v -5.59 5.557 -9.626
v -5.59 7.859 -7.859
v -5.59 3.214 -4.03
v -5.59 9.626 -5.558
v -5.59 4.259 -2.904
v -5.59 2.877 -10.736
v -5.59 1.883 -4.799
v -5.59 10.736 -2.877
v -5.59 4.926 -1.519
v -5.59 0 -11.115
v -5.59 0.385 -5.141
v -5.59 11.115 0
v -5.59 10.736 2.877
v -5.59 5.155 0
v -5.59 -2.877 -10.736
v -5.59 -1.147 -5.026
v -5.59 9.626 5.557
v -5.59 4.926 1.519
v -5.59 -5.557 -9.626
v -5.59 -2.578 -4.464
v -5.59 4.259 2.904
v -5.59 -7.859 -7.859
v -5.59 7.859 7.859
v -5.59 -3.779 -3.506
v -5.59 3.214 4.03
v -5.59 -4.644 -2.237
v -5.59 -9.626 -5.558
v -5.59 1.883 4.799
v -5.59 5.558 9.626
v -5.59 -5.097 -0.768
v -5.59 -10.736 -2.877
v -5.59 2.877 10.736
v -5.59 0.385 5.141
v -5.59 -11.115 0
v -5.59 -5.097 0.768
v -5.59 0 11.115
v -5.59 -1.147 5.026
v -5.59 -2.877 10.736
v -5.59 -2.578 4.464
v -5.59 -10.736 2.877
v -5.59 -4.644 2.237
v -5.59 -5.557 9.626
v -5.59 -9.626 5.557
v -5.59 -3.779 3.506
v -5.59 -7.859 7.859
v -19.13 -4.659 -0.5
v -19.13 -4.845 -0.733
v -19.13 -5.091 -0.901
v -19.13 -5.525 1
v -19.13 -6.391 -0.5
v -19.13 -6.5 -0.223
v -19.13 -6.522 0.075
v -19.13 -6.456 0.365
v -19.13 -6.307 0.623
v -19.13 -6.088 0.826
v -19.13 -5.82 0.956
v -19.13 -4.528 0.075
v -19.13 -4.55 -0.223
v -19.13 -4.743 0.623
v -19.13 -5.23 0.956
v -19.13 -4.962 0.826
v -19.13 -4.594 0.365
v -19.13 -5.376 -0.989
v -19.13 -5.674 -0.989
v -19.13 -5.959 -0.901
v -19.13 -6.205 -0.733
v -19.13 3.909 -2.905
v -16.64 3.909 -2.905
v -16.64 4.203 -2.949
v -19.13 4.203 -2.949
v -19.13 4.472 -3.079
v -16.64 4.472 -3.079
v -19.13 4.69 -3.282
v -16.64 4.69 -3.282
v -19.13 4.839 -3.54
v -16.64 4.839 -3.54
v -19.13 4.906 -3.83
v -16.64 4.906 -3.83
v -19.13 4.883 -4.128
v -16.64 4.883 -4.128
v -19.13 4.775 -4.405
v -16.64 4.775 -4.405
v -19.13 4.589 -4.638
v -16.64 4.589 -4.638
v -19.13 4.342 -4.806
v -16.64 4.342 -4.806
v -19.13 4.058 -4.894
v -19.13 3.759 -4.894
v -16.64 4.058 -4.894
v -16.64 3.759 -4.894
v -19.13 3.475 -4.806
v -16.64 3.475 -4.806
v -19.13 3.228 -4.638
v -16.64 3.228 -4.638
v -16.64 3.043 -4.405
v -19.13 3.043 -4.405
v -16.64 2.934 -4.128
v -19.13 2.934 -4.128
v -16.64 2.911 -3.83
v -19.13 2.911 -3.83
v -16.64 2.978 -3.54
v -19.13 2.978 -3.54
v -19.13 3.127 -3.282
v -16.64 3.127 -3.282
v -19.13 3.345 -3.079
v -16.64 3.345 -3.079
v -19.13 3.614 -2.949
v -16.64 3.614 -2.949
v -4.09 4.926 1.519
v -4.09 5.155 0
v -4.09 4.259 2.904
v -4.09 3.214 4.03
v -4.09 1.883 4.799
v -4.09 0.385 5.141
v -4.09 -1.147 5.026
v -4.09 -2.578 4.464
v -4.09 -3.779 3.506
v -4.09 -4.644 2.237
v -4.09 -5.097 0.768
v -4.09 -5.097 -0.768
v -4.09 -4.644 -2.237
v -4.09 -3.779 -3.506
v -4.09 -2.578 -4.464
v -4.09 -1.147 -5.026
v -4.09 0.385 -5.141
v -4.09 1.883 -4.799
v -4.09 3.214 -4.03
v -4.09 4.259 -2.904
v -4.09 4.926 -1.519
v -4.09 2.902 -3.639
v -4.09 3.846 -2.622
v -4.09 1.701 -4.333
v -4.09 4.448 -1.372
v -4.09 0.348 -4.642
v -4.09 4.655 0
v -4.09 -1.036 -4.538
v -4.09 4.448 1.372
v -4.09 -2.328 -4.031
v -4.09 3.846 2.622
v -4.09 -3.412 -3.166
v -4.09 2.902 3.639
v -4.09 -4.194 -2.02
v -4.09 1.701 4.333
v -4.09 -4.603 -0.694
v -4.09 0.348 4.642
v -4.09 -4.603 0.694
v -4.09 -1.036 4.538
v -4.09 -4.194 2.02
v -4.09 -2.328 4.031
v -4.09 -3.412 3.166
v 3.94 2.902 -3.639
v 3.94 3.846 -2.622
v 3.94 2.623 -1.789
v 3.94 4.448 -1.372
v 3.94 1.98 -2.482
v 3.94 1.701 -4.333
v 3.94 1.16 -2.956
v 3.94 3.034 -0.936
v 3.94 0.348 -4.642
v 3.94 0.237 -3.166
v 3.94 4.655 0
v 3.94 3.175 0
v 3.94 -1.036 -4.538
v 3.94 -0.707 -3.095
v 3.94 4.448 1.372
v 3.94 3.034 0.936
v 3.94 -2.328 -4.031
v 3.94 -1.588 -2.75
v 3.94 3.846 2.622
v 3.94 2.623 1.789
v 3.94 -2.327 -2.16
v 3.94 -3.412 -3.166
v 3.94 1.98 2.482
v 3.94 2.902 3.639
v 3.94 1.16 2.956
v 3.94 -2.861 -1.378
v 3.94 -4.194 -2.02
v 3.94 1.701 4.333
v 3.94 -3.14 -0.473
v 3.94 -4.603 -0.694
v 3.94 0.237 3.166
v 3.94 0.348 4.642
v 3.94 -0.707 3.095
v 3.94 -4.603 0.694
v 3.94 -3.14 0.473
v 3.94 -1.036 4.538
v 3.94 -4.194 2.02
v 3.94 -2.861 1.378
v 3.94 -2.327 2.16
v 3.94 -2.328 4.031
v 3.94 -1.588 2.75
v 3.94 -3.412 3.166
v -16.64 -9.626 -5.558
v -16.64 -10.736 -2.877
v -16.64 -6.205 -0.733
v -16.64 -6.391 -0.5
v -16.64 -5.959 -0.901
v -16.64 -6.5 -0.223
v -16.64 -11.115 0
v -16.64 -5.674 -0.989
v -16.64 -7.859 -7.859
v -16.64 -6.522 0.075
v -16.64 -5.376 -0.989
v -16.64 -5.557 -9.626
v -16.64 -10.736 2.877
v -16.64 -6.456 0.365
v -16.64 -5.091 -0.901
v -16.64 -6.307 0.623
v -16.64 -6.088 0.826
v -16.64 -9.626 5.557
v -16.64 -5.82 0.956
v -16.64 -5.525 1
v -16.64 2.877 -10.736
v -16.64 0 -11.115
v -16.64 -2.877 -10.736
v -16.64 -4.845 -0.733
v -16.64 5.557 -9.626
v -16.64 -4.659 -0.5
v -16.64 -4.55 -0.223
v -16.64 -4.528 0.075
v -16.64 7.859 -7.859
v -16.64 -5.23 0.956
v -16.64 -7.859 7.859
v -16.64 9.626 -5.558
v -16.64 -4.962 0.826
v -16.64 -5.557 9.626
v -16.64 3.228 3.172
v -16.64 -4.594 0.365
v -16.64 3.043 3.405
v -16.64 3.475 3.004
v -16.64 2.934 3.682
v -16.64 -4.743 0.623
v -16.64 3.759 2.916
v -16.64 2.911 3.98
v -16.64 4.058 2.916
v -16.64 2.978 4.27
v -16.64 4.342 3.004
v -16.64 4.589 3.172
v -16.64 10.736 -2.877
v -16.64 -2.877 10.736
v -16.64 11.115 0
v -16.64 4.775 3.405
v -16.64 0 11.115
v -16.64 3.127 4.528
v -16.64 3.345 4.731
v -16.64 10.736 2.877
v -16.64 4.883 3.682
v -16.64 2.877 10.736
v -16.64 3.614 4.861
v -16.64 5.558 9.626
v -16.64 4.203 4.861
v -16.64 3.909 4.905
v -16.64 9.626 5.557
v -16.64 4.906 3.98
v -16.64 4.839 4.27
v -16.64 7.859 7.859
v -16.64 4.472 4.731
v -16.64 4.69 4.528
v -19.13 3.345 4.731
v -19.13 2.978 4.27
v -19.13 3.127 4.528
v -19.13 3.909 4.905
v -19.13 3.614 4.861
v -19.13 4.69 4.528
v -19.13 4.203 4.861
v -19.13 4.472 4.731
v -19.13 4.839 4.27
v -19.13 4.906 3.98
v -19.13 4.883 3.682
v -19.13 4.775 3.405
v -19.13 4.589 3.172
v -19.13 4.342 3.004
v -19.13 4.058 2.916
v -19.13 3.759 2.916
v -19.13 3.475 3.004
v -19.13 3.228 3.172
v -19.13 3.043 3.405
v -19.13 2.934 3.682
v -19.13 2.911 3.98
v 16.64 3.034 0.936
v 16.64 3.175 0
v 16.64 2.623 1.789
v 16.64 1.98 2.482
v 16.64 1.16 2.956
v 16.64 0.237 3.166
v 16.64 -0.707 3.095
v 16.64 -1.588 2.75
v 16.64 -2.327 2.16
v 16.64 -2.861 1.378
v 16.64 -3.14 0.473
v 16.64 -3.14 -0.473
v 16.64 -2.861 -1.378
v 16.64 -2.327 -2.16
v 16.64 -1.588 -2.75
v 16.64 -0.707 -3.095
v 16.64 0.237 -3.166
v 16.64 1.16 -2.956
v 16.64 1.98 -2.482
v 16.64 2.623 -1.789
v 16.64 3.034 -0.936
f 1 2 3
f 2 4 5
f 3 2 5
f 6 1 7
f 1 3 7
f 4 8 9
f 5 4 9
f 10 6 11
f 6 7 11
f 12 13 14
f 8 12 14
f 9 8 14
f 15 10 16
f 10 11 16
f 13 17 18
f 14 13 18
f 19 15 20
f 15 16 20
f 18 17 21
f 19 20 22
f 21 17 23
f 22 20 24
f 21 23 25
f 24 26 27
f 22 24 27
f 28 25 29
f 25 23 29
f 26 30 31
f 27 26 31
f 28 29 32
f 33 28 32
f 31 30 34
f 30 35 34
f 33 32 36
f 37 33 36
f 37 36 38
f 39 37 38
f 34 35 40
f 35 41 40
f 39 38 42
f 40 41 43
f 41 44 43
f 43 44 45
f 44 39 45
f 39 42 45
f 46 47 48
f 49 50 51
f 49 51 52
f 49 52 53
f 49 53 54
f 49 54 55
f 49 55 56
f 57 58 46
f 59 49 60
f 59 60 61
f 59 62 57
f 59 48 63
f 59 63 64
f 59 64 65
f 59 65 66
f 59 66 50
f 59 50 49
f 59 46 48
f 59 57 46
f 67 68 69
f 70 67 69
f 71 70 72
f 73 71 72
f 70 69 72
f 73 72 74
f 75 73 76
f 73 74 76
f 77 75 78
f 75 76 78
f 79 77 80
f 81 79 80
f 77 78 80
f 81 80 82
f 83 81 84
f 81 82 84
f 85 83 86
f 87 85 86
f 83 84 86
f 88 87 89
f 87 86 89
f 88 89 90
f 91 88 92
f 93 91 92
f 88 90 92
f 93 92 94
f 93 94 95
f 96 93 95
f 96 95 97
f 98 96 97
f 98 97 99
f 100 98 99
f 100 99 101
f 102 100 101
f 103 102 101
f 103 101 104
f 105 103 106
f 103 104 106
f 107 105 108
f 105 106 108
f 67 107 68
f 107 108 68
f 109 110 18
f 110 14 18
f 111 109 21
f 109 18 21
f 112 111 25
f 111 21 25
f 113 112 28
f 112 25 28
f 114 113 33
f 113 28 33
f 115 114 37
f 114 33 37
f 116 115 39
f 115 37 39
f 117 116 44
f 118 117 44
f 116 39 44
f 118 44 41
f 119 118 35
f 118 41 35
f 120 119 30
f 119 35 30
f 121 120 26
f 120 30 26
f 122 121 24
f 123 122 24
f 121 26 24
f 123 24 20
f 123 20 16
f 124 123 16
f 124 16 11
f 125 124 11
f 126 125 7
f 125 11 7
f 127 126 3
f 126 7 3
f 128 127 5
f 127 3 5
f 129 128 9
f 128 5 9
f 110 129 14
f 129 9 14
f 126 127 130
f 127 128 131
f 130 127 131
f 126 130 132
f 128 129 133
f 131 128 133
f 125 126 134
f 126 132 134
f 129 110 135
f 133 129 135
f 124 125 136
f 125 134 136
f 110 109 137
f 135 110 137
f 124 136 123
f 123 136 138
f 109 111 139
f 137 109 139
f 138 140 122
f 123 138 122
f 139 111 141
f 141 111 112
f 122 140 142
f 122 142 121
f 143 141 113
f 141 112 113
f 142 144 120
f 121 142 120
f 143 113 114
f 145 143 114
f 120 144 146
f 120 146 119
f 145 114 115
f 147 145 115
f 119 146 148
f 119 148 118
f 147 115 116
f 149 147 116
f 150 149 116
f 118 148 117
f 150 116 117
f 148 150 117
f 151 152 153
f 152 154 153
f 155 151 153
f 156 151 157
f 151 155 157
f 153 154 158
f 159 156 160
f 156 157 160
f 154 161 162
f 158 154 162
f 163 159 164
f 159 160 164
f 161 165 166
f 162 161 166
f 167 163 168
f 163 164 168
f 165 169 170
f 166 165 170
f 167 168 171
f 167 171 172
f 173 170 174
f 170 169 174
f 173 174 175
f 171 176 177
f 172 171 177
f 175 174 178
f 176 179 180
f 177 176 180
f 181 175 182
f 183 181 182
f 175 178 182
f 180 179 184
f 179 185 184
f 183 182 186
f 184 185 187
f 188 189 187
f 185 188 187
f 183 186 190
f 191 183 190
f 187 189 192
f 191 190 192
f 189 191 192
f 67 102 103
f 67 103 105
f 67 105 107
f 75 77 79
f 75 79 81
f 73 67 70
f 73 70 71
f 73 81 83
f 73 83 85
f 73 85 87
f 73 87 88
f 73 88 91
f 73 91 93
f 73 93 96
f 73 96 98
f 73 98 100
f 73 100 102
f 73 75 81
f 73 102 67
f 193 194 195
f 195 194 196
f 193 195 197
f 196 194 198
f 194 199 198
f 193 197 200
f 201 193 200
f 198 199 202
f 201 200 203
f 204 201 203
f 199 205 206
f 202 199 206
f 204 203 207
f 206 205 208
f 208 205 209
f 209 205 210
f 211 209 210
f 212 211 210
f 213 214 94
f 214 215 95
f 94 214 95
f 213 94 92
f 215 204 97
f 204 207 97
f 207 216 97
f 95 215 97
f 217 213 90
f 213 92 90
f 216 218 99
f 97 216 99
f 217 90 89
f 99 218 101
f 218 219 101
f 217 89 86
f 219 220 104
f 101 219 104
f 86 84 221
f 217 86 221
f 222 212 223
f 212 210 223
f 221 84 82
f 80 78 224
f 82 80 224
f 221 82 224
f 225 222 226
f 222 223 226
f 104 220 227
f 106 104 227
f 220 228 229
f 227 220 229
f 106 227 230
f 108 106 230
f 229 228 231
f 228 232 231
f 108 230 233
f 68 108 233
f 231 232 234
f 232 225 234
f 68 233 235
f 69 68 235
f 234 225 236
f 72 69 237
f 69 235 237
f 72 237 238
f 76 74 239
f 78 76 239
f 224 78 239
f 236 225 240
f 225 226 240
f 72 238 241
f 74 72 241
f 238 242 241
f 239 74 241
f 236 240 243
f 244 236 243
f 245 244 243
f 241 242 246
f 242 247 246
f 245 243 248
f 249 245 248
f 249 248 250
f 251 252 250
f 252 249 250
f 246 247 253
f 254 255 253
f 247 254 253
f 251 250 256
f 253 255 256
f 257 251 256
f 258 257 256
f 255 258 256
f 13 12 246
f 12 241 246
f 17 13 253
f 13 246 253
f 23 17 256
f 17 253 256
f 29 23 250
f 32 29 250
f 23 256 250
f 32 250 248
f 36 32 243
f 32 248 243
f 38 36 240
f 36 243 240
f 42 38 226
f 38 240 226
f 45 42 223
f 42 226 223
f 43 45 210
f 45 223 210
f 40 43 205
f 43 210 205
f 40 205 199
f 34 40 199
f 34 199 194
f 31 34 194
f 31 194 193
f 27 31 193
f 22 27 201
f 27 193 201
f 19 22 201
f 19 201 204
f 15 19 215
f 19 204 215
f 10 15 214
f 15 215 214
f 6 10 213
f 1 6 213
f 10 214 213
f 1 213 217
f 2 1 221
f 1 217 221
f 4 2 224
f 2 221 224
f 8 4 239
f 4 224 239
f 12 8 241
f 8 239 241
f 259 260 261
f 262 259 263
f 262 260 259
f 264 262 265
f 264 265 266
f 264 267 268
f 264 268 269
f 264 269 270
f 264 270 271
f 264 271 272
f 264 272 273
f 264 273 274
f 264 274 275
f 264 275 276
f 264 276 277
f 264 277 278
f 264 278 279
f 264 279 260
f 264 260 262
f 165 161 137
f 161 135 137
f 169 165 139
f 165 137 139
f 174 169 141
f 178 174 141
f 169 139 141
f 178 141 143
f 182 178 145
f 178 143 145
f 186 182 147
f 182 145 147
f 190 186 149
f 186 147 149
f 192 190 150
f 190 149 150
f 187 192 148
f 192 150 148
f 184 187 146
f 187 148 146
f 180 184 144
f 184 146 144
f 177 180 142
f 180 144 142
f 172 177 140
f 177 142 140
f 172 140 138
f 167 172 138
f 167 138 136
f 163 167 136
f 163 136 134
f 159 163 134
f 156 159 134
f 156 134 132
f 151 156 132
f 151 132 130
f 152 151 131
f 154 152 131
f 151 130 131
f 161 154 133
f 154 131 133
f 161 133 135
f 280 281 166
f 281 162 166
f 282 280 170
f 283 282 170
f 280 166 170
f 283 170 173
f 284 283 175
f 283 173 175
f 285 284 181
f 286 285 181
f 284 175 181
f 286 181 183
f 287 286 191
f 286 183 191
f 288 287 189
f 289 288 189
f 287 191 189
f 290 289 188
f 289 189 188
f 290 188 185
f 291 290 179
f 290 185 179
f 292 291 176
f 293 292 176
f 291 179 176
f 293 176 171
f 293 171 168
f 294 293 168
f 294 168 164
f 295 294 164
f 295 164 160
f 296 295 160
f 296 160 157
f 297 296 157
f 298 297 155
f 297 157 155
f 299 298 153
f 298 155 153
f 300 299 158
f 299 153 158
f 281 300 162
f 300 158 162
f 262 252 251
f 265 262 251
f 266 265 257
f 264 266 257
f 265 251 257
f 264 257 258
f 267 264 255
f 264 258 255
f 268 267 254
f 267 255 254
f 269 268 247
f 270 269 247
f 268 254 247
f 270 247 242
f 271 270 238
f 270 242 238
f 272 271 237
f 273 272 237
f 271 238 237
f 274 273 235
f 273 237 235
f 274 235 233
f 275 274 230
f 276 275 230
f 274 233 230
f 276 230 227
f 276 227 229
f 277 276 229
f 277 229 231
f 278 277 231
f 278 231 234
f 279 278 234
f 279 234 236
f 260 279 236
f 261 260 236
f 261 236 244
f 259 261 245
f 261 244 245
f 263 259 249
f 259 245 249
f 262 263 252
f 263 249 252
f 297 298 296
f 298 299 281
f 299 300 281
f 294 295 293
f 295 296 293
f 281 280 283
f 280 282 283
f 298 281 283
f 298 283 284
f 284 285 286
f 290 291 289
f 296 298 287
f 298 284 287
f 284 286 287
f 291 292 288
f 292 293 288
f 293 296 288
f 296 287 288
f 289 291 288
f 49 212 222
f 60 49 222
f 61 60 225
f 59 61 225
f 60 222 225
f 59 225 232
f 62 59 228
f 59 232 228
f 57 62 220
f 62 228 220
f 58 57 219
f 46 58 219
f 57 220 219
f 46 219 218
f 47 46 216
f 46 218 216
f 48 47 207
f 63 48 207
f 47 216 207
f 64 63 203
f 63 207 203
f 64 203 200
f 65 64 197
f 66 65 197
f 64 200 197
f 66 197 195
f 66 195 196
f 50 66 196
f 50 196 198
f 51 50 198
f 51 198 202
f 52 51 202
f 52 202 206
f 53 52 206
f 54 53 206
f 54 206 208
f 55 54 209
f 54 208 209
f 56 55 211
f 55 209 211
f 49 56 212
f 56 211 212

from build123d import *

# Parameters (mm, degrees)
SKETCH2_R           = 1
BOSS_EXTRUDE1_DEPTH = 2.49


with BuildPart() as part:
    # Sketch1 → Revolve1 (revolve)
    with BuildSketch(Plane.XY):
        Polygon((-16.64, 0), (16.64, 0), (16.64, 3.175), (3.94, 3.175), (3.94, 4.655), (-4.09, 4.655), (-4.09, 5.155), (-5.59, 5.155), (-5.59, 11.115), (-16.64, 11.115), align=None)
    revolve(axis=Axis((-16.64, 0, 0), (1, 0, 0)))

    # Sketch2 → Boss-Extrude1 (add)
    with BuildSketch(Plane.ZY.offset(16.64)):
        with Locations((-3.905, 3.908529135)):
            Circle(SKETCH2_R)
        with Locations((3.905, 3.908529135)):
            Circle(SKETCH2_R)
        with Locations((0, -5.525)):
            Circle(SKETCH2_R)
    extrude(amount=BOSS_EXTRUDE1_DEPTH)


solid = part.part
